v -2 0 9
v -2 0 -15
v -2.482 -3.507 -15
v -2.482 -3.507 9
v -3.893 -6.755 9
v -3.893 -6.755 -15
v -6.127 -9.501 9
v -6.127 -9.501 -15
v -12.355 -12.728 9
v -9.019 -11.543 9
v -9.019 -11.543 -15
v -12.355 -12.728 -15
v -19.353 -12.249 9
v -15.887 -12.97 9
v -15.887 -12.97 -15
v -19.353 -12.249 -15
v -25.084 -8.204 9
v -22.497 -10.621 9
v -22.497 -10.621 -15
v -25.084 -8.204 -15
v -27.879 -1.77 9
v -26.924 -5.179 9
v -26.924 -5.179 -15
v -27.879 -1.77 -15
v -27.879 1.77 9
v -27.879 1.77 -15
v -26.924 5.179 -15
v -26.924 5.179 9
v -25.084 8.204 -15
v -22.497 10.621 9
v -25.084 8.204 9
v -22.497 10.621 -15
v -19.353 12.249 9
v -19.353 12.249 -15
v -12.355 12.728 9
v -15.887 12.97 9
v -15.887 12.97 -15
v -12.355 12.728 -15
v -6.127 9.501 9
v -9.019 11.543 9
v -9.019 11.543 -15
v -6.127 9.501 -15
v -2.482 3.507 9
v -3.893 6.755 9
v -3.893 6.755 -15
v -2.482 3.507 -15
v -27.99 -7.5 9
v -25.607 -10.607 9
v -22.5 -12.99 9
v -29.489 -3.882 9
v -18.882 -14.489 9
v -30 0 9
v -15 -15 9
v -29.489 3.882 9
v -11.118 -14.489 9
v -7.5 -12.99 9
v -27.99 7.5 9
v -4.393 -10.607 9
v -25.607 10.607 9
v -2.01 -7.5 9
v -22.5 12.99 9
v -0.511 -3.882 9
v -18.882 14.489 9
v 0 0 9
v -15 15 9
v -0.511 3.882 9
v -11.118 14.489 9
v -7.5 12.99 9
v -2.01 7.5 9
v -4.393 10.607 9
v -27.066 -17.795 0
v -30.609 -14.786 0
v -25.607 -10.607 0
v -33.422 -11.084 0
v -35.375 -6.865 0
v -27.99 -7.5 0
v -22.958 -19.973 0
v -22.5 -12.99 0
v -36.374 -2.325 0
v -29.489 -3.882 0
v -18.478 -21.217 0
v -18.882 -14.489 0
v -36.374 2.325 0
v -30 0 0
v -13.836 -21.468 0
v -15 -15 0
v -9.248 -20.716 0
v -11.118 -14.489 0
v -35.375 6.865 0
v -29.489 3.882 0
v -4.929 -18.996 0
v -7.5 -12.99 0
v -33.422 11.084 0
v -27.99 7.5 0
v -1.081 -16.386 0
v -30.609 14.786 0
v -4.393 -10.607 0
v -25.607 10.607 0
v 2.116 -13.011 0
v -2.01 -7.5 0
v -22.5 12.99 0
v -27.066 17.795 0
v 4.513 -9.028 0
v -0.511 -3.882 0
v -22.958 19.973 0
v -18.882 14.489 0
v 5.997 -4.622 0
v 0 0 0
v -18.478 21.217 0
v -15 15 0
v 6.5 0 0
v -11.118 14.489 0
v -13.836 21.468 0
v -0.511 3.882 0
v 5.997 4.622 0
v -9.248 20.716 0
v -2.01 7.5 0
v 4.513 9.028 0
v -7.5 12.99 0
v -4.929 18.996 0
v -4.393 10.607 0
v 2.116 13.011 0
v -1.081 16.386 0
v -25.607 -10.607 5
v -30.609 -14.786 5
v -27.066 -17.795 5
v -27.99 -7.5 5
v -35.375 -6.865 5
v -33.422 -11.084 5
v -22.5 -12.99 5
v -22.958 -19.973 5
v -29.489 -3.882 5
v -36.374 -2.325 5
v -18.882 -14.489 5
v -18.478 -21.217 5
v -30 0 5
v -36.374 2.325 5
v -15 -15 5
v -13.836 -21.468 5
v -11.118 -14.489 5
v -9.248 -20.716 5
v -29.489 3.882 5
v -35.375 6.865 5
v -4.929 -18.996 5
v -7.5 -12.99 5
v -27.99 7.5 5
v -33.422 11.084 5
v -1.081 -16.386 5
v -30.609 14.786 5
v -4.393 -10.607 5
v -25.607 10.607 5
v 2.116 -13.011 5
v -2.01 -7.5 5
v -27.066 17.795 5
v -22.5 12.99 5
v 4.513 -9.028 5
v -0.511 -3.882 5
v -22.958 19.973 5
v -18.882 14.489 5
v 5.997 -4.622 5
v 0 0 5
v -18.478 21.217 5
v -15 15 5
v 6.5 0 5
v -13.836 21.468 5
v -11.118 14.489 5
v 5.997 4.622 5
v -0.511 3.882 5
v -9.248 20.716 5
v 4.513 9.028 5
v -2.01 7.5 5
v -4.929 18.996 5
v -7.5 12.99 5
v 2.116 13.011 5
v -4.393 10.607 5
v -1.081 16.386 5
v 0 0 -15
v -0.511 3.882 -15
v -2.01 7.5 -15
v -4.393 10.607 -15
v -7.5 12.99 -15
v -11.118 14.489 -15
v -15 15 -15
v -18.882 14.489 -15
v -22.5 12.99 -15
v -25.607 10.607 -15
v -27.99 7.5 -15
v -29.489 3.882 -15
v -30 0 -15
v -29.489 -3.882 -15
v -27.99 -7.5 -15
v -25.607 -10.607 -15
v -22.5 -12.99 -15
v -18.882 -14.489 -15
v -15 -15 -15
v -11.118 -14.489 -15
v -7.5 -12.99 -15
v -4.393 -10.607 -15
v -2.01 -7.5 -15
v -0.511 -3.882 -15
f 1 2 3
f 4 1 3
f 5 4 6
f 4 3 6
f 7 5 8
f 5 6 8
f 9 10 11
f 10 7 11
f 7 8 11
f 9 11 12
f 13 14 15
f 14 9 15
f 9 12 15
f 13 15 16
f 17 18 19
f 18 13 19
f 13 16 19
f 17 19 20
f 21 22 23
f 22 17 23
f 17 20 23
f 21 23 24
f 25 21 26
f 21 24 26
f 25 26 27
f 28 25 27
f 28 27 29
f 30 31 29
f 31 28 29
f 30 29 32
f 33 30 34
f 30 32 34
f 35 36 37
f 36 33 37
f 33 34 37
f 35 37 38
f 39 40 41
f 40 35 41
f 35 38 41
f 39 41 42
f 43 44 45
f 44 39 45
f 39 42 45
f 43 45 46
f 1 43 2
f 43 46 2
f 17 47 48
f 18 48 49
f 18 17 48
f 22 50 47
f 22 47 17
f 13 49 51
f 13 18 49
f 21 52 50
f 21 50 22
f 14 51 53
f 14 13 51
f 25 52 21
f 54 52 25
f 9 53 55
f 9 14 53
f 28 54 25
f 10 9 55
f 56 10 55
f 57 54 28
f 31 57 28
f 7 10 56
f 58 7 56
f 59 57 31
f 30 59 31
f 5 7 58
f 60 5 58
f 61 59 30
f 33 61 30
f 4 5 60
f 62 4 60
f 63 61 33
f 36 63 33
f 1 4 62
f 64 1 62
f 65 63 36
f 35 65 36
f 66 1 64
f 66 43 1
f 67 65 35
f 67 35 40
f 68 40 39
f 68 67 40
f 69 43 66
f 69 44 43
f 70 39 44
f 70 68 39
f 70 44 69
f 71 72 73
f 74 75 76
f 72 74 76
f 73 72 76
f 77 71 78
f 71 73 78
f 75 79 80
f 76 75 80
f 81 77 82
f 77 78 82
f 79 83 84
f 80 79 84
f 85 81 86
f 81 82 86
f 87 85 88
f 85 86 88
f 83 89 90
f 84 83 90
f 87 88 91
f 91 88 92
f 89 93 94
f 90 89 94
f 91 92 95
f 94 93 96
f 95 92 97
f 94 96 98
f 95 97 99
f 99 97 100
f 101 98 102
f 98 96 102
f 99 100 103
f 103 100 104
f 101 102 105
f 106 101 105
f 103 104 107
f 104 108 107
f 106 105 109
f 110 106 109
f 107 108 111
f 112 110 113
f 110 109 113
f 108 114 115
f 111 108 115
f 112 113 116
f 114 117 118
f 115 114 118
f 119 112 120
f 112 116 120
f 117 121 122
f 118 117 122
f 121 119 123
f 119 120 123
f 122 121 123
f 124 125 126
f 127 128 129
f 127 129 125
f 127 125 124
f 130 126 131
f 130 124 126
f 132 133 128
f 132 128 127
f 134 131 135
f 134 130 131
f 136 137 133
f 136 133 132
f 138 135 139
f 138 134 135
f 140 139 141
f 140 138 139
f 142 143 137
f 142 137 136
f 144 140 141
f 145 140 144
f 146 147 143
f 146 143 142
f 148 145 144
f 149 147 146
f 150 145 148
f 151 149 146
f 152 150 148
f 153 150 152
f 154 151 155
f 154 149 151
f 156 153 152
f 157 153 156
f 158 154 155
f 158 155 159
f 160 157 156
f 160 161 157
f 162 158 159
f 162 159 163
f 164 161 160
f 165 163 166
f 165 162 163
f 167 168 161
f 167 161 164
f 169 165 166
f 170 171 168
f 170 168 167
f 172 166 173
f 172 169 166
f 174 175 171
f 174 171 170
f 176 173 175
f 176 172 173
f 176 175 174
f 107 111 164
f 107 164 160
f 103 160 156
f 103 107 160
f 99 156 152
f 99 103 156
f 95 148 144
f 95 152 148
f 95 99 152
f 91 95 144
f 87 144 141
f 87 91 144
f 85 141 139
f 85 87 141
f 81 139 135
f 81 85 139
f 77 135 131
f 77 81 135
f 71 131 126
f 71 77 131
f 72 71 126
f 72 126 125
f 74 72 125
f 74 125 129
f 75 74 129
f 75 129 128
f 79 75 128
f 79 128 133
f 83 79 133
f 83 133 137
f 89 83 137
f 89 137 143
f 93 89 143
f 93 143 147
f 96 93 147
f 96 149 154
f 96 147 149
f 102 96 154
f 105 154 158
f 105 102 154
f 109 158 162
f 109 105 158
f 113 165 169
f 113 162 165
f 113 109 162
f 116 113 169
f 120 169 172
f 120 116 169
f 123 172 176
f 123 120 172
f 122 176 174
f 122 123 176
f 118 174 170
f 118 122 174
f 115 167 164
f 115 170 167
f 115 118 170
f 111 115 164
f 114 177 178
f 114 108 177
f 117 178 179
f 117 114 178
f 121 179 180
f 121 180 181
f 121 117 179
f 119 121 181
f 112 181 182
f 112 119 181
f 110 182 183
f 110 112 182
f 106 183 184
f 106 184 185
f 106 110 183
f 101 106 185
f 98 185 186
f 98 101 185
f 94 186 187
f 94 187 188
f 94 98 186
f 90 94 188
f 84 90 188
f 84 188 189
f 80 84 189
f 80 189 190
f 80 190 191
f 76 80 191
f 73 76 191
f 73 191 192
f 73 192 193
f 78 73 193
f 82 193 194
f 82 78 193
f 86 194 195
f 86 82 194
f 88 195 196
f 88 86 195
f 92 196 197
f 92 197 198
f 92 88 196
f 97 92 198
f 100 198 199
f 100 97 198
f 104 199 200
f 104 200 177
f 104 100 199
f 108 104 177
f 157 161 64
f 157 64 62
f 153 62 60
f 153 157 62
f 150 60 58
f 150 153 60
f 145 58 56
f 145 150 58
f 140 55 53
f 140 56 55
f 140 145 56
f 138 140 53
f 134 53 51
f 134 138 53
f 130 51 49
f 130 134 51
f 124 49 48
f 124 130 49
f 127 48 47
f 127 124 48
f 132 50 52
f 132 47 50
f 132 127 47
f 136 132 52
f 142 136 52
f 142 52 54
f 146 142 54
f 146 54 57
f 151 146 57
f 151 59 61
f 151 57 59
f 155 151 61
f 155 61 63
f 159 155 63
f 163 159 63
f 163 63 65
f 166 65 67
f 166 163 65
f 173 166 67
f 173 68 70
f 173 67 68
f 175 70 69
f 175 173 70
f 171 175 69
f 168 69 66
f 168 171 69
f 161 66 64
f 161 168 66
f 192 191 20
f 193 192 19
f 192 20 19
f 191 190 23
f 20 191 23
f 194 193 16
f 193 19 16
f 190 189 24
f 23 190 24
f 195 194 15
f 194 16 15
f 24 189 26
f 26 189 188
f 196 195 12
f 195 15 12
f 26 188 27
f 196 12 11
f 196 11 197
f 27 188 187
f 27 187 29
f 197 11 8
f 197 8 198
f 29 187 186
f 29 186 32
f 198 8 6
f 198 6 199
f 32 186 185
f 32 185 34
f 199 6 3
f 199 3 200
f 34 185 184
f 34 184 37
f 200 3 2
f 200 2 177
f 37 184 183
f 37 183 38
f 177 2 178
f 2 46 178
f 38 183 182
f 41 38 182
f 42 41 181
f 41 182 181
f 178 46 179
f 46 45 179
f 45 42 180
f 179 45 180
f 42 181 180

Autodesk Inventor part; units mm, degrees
ref_plane "YZ Plane" through (0, 0, 0) normal (1, 0, 0) x (0, 1, 0)
ref_plane "XZ Plane" through (0, 0, 0) normal (0, 1, 0) x (-1, 0, 0)
ref_plane "XY Plane" through (0, 0, 0) normal (0, 0, 1) x (1, 0, 0)
ref_plane "Plano de trabalho1" through (0, 0, 0) normal (0, 0, 1) x (1, 0, 0)
sketch "Esboço1" plane through (0, 0, 0) normal (0, 0, 1) x (1, 0, 0)
  circle A0 centre (-15, 0) radius 15 projected
  circle A1 centre (-15, 0) radius 13
  point P0 (0, 0)
  dimension "d0" = 2
extrude "Extrusão1" add sketch "Esboço1" against normal blind 15
sketch "Esboço2" plane through (-15, 0, 0) normal (0, 0, 1) x (1, 0, 0)
  circle A0 centre (0, 0) radius 13 projected
  circle A1 centre (0, 0) radius 20 projected
  circle A2 centre (0, 0) radius 21.5
  point P0 (15, 0)
  dimension "d3" = 43
extrude "Extrusão2" add sketch "Esboço2" along normal blind 5 contours A1 | A2
sketch "Esboço3" plane through (-15, 0, 5) normal (0, 0, 1) x (1, 0, 0)
  circle A0 centre (0, 0) radius 13 projected
  circle A1 centre (0, 0) radius 15 projected
  point P0 (15, 0)
extrude "Extrusão3" add sketch "Esboço3" along normal blind 4
properties part number "Adaptador de Saida"
